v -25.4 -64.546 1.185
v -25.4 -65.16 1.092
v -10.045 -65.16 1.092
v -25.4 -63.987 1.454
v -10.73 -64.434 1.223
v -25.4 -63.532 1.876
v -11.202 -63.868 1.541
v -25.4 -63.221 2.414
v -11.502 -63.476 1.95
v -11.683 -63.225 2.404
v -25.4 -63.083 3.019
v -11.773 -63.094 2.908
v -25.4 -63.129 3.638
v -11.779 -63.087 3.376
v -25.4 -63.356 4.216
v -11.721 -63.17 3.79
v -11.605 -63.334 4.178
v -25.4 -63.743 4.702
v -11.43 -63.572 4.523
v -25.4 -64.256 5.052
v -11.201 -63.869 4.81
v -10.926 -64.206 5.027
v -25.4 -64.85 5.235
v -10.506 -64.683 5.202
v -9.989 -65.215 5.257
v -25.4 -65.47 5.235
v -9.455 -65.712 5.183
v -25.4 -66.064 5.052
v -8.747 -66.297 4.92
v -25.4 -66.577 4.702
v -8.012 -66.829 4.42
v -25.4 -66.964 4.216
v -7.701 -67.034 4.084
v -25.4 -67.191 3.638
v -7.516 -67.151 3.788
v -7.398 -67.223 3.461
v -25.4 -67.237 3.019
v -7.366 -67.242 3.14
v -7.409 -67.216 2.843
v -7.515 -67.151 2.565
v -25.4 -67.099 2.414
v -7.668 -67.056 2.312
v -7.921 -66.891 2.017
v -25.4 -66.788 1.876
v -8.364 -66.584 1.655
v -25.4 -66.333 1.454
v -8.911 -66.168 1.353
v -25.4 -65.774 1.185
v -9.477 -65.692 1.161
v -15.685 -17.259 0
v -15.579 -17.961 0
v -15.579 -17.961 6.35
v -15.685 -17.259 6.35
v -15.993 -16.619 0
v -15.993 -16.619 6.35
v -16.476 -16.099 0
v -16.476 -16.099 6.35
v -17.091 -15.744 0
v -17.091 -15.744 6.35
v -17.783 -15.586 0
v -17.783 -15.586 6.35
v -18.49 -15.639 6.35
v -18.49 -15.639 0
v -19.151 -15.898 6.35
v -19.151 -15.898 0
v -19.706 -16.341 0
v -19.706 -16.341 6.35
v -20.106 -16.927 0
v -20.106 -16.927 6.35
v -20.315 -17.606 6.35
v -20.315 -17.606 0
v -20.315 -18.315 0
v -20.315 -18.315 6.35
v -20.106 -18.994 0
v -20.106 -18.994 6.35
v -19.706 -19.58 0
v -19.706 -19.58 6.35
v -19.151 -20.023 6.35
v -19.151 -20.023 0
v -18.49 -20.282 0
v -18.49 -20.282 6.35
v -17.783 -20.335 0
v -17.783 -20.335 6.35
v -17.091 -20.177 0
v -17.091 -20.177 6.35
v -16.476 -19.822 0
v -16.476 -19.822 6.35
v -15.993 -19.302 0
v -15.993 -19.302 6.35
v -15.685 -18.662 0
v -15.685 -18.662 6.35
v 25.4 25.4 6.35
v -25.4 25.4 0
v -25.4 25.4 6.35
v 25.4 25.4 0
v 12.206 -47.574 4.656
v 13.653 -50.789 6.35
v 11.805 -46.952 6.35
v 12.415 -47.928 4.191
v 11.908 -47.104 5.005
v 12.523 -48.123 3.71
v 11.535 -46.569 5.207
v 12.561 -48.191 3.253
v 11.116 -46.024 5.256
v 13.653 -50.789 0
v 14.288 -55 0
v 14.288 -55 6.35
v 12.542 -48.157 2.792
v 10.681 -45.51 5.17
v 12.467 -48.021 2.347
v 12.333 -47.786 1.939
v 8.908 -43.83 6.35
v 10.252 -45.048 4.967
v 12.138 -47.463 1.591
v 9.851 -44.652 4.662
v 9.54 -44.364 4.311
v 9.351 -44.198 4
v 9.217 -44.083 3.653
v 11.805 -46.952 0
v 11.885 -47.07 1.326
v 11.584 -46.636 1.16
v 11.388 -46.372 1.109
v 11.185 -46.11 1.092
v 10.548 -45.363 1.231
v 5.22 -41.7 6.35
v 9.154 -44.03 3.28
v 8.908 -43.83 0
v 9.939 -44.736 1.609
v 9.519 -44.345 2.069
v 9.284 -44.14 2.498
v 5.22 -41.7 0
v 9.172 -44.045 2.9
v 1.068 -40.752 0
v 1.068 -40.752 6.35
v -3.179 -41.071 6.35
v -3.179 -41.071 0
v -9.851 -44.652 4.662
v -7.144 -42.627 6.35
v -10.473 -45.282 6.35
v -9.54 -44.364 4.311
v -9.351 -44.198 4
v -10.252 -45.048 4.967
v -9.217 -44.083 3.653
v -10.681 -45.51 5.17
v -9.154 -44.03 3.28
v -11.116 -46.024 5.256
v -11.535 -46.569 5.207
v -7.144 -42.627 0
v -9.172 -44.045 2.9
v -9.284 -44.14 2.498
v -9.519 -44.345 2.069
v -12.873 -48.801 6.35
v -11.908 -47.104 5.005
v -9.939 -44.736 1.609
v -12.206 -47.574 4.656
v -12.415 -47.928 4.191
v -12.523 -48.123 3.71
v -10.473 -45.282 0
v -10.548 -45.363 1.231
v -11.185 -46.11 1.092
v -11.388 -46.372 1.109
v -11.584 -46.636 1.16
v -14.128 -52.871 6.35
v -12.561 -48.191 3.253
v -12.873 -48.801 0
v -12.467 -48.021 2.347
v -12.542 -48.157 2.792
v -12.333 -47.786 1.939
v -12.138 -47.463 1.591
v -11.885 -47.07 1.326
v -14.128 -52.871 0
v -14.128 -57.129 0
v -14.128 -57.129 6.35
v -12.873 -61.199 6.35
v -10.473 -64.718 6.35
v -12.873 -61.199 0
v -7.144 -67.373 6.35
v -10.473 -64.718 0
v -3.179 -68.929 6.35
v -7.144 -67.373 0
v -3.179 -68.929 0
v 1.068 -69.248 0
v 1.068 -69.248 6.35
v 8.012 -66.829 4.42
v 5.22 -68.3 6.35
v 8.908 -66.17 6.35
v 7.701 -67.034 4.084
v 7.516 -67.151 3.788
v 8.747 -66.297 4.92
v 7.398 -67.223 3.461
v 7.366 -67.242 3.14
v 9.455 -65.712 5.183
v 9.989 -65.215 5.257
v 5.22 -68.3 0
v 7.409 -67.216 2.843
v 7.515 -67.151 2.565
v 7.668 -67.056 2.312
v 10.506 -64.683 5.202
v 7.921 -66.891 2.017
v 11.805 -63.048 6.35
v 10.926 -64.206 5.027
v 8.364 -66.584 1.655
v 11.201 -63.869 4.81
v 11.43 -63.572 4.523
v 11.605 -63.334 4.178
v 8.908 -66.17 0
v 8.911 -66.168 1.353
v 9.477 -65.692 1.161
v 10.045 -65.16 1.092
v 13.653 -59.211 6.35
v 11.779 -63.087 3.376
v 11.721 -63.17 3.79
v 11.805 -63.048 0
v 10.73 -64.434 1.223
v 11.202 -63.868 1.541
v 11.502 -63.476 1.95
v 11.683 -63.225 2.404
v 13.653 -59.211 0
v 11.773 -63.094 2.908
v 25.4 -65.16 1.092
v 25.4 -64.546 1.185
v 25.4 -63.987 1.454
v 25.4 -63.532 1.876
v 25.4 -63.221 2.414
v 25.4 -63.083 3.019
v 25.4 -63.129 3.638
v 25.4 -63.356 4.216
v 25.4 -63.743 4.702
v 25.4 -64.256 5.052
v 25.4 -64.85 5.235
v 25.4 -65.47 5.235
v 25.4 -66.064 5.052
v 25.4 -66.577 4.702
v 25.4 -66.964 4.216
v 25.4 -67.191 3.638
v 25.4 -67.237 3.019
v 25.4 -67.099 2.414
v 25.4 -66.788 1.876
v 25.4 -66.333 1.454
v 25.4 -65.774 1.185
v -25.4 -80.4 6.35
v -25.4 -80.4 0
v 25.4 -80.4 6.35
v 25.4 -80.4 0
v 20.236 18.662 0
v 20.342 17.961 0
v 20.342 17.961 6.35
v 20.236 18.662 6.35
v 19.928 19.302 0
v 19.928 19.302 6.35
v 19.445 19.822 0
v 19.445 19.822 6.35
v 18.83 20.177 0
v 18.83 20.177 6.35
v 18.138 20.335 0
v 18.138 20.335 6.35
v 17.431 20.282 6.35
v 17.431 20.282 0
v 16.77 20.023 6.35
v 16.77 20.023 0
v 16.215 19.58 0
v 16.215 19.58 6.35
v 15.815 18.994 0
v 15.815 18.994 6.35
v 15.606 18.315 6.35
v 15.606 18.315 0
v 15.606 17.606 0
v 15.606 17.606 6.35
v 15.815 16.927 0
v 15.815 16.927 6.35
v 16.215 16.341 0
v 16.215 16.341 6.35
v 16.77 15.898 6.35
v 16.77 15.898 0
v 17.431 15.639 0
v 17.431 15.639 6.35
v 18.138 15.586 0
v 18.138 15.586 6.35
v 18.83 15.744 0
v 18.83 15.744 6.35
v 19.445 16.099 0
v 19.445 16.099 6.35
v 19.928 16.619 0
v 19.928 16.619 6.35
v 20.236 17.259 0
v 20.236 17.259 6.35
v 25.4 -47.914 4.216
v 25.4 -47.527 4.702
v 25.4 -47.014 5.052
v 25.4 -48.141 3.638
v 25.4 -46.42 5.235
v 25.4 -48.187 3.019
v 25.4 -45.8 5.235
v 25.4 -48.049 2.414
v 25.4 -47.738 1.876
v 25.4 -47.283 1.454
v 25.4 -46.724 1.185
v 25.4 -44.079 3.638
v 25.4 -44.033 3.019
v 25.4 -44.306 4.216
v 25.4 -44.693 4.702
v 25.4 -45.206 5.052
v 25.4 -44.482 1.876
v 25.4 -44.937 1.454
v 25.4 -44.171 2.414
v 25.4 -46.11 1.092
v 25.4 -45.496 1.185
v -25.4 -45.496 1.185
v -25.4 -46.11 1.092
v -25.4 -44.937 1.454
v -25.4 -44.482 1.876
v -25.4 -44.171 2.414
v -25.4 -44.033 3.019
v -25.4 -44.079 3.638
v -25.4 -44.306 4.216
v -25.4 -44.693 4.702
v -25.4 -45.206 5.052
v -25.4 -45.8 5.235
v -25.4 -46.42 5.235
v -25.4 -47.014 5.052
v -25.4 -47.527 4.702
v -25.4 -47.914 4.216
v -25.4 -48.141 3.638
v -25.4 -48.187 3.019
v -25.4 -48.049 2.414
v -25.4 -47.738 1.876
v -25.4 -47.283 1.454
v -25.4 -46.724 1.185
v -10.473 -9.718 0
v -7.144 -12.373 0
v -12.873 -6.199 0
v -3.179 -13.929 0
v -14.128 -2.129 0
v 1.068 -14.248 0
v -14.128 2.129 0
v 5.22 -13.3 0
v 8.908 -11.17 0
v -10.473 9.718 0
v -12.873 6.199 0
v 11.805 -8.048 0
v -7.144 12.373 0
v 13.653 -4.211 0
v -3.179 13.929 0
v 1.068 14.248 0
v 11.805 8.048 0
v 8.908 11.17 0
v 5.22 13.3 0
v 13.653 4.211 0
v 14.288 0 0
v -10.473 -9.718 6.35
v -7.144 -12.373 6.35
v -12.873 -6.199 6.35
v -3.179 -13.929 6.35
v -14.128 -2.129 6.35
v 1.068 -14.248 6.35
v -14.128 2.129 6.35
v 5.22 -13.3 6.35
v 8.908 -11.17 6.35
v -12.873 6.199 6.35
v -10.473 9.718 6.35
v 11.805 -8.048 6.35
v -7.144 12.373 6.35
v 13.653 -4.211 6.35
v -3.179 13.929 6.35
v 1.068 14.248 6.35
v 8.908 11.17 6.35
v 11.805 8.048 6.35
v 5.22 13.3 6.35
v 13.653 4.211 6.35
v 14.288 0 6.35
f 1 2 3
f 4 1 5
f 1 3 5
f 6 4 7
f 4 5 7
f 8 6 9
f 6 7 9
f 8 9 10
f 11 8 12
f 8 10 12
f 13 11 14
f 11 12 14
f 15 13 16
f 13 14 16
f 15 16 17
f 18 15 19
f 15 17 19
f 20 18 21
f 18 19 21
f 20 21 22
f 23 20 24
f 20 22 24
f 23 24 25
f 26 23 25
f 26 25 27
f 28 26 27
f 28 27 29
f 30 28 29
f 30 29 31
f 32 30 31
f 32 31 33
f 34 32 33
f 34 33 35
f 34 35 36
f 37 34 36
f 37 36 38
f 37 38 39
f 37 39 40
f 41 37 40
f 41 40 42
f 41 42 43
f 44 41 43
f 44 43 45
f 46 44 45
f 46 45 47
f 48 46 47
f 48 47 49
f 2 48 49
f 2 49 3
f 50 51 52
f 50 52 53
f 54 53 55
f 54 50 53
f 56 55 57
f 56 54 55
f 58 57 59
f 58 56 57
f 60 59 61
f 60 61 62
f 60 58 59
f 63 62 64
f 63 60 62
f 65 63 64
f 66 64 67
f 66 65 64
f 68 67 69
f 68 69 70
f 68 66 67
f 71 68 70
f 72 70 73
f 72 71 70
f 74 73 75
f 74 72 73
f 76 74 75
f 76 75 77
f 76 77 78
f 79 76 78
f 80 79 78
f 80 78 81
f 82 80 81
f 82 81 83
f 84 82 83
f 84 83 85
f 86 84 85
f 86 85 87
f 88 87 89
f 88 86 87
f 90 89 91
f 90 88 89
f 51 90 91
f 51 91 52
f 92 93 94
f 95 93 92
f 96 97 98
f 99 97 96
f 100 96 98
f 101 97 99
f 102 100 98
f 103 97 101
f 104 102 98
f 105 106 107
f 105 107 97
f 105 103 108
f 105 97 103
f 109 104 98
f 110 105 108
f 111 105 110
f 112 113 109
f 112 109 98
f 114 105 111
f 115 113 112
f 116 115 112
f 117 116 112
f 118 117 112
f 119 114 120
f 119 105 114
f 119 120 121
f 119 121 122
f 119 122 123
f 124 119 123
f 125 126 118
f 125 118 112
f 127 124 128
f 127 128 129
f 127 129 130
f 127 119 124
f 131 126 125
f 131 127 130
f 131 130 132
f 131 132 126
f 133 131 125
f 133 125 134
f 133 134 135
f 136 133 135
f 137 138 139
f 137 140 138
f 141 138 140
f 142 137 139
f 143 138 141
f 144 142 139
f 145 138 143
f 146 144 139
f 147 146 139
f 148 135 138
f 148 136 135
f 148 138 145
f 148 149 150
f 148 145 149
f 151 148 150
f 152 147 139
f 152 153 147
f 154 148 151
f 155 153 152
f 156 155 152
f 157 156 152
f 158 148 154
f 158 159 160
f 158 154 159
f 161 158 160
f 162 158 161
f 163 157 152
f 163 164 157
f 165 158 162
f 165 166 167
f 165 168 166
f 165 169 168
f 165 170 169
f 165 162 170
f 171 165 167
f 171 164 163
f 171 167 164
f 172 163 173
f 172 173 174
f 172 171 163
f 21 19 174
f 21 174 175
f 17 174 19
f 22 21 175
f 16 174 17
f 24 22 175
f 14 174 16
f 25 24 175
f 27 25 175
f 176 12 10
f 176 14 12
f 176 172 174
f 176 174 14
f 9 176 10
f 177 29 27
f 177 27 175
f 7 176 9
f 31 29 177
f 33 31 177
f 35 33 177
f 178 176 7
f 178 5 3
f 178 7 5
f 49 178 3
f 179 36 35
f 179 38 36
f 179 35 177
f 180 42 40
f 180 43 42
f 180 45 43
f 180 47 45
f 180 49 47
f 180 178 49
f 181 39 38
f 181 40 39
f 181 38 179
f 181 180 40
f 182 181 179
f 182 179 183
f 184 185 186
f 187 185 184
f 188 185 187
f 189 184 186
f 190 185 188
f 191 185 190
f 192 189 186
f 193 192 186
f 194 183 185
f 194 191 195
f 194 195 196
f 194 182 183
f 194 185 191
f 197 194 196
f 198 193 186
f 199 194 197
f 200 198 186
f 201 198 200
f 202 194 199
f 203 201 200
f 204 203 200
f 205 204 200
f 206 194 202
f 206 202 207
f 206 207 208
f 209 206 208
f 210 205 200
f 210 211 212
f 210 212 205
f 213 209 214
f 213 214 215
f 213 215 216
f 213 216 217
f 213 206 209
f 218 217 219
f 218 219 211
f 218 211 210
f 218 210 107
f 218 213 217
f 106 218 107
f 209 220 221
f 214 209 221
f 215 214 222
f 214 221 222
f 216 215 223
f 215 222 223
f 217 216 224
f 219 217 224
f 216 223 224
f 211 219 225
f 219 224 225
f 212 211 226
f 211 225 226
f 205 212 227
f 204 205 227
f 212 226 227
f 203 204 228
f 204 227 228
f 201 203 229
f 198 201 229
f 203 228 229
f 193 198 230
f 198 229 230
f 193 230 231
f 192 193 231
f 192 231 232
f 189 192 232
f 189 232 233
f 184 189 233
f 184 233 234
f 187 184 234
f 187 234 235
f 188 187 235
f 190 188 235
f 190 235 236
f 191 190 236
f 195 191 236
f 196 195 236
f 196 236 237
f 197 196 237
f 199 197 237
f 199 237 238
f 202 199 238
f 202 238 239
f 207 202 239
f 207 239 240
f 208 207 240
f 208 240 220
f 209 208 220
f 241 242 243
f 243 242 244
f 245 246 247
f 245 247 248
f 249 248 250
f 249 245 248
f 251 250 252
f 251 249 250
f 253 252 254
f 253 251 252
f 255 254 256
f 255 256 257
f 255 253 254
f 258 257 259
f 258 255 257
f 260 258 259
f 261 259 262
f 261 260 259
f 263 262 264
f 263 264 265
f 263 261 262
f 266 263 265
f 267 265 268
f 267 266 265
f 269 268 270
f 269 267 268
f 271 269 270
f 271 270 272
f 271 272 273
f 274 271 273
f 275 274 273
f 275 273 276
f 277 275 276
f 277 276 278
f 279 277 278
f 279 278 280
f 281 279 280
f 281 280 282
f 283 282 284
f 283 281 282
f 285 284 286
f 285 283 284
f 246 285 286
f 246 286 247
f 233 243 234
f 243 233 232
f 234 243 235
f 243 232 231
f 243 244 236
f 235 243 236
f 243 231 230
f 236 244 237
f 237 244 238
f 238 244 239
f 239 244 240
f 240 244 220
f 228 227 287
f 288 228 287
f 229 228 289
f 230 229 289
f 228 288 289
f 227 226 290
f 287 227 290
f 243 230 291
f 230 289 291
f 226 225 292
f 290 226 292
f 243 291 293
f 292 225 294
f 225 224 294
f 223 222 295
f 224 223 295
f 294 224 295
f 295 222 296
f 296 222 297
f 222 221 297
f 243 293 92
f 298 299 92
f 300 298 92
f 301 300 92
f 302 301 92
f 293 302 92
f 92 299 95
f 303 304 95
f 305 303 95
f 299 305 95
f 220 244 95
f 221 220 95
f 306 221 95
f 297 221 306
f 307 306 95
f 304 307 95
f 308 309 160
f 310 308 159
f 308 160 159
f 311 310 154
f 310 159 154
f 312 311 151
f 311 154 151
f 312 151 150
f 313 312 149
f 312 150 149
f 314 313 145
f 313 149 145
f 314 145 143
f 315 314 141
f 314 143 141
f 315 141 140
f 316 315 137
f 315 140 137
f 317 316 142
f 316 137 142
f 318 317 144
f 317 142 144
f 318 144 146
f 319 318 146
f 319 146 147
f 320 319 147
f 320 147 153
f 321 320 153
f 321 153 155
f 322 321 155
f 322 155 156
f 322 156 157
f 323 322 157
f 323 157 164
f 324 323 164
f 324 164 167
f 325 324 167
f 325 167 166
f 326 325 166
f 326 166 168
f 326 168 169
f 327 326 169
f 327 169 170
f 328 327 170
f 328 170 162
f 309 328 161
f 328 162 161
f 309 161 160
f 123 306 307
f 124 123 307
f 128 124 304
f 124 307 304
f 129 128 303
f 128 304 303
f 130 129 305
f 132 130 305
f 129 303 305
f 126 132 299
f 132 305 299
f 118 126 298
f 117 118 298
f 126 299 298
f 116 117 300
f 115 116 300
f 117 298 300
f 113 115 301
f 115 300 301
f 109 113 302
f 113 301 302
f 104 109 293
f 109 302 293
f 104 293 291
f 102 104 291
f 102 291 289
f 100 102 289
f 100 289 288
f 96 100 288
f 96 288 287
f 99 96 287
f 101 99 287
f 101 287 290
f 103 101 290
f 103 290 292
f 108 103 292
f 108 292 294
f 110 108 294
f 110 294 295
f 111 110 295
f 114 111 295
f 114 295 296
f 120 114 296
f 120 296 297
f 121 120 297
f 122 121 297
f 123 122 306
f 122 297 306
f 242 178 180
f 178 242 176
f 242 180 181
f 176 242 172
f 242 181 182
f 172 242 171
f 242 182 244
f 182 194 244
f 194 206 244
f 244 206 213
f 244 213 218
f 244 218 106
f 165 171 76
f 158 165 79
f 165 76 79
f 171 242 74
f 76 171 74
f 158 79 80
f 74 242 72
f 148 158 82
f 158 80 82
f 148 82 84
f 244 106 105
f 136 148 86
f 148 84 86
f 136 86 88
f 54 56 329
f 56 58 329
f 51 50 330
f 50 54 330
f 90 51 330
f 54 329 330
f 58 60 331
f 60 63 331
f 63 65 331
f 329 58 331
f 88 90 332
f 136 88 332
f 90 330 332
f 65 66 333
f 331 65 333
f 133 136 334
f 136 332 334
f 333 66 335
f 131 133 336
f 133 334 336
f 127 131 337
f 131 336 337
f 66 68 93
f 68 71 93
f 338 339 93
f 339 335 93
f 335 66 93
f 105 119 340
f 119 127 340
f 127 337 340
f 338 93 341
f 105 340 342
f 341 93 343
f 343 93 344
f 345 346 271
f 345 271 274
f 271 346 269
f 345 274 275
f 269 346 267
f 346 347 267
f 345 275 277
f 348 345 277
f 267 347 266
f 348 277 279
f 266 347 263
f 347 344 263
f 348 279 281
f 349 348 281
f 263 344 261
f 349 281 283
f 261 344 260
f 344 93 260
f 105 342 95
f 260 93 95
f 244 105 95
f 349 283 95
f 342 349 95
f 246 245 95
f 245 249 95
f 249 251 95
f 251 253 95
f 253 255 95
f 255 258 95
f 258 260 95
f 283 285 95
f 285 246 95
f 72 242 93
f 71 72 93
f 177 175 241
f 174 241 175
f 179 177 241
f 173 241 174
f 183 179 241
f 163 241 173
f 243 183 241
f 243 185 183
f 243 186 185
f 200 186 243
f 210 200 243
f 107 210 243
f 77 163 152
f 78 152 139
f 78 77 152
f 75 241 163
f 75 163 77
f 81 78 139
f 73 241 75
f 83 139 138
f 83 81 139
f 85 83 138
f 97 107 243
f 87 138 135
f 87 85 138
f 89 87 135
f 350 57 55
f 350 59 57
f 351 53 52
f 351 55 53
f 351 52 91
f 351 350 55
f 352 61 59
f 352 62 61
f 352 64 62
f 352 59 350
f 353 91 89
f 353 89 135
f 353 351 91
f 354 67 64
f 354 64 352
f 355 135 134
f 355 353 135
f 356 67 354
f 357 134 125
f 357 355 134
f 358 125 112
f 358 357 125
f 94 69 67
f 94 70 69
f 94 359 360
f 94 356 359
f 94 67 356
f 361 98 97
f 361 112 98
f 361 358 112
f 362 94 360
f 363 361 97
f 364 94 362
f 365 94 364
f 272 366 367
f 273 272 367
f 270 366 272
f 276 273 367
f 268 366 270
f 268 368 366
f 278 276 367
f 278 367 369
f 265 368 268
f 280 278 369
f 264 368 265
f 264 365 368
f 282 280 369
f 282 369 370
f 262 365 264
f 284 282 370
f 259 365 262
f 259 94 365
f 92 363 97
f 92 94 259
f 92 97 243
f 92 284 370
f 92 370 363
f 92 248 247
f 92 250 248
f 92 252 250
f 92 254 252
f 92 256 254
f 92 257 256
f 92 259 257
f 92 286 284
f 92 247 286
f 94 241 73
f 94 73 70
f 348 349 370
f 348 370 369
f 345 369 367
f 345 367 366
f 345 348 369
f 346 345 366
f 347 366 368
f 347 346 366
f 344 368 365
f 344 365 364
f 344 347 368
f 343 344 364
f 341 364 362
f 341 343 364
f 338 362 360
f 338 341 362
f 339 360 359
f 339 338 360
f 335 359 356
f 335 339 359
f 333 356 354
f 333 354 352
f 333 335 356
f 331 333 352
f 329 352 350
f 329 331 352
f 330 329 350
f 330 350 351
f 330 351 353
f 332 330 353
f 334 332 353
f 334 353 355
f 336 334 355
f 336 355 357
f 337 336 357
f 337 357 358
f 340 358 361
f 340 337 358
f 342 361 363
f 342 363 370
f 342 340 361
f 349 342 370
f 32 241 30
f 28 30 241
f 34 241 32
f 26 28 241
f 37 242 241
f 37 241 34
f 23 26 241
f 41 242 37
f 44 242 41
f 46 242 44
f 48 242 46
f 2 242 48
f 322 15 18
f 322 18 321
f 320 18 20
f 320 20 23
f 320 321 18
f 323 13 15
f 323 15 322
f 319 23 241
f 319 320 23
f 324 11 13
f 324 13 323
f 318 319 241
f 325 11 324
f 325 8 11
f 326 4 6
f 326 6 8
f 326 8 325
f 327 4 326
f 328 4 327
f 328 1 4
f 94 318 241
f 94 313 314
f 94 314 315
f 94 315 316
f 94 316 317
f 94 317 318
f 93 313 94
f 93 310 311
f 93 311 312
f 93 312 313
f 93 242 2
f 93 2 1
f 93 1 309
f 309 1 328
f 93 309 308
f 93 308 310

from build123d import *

# Parameters (mm, degrees)
SKETCH2_W           = 50.8
SKETCH2_H           = 105.799998966
SKETCH2_R           = 14.2875
SKETCH2_R_2         = 2.38125
BOSS_EXTRUDE1_DEPTH = 6.35
SKETCH6_R           = 2.0828
CUT_EXTRUDE1_DEPTH  = 51.8


with BuildPart() as part:
    # Sketch2 → Boss-Extrude1 (new body)
    with BuildSketch(Plane.XY):
        with Locations((0, -27.499999483)):
            Rectangle(SKETCH2_W, SKETCH2_H)
        Circle(SKETCH2_R, mode=Mode.SUBTRACT)
        with Locations((0, -54.999998966)):
            Circle(SKETCH2_R, mode=Mode.SUBTRACT)
        with Locations((-17.960512242, -17.960512242)):
            Circle(SKETCH2_R_2, mode=Mode.SUBTRACT)
        with Locations((17.960512242, 17.960512242)):
            Circle(SKETCH2_R_2, mode=Mode.SUBTRACT)
    extrude(amount=BOSS_EXTRUDE1_DEPTH)

    # Sketch6 → Cut-Extrude1 (cut, through all)
    with BuildSketch(Plane(origin=(25.4, 0, 0), x_dir=(0, 0, -1), z_dir=(1, 0, 0))):
        with Locations((-3.175, -65.159998966)):
            Circle(SKETCH6_R)
        with Locations((-3.175, -46.109998966)):
            Circle(SKETCH6_R)
    extrude(amount=-CUT_EXTRUDE1_DEPTH, mode=Mode.SUBTRACT)


solid = part.part
